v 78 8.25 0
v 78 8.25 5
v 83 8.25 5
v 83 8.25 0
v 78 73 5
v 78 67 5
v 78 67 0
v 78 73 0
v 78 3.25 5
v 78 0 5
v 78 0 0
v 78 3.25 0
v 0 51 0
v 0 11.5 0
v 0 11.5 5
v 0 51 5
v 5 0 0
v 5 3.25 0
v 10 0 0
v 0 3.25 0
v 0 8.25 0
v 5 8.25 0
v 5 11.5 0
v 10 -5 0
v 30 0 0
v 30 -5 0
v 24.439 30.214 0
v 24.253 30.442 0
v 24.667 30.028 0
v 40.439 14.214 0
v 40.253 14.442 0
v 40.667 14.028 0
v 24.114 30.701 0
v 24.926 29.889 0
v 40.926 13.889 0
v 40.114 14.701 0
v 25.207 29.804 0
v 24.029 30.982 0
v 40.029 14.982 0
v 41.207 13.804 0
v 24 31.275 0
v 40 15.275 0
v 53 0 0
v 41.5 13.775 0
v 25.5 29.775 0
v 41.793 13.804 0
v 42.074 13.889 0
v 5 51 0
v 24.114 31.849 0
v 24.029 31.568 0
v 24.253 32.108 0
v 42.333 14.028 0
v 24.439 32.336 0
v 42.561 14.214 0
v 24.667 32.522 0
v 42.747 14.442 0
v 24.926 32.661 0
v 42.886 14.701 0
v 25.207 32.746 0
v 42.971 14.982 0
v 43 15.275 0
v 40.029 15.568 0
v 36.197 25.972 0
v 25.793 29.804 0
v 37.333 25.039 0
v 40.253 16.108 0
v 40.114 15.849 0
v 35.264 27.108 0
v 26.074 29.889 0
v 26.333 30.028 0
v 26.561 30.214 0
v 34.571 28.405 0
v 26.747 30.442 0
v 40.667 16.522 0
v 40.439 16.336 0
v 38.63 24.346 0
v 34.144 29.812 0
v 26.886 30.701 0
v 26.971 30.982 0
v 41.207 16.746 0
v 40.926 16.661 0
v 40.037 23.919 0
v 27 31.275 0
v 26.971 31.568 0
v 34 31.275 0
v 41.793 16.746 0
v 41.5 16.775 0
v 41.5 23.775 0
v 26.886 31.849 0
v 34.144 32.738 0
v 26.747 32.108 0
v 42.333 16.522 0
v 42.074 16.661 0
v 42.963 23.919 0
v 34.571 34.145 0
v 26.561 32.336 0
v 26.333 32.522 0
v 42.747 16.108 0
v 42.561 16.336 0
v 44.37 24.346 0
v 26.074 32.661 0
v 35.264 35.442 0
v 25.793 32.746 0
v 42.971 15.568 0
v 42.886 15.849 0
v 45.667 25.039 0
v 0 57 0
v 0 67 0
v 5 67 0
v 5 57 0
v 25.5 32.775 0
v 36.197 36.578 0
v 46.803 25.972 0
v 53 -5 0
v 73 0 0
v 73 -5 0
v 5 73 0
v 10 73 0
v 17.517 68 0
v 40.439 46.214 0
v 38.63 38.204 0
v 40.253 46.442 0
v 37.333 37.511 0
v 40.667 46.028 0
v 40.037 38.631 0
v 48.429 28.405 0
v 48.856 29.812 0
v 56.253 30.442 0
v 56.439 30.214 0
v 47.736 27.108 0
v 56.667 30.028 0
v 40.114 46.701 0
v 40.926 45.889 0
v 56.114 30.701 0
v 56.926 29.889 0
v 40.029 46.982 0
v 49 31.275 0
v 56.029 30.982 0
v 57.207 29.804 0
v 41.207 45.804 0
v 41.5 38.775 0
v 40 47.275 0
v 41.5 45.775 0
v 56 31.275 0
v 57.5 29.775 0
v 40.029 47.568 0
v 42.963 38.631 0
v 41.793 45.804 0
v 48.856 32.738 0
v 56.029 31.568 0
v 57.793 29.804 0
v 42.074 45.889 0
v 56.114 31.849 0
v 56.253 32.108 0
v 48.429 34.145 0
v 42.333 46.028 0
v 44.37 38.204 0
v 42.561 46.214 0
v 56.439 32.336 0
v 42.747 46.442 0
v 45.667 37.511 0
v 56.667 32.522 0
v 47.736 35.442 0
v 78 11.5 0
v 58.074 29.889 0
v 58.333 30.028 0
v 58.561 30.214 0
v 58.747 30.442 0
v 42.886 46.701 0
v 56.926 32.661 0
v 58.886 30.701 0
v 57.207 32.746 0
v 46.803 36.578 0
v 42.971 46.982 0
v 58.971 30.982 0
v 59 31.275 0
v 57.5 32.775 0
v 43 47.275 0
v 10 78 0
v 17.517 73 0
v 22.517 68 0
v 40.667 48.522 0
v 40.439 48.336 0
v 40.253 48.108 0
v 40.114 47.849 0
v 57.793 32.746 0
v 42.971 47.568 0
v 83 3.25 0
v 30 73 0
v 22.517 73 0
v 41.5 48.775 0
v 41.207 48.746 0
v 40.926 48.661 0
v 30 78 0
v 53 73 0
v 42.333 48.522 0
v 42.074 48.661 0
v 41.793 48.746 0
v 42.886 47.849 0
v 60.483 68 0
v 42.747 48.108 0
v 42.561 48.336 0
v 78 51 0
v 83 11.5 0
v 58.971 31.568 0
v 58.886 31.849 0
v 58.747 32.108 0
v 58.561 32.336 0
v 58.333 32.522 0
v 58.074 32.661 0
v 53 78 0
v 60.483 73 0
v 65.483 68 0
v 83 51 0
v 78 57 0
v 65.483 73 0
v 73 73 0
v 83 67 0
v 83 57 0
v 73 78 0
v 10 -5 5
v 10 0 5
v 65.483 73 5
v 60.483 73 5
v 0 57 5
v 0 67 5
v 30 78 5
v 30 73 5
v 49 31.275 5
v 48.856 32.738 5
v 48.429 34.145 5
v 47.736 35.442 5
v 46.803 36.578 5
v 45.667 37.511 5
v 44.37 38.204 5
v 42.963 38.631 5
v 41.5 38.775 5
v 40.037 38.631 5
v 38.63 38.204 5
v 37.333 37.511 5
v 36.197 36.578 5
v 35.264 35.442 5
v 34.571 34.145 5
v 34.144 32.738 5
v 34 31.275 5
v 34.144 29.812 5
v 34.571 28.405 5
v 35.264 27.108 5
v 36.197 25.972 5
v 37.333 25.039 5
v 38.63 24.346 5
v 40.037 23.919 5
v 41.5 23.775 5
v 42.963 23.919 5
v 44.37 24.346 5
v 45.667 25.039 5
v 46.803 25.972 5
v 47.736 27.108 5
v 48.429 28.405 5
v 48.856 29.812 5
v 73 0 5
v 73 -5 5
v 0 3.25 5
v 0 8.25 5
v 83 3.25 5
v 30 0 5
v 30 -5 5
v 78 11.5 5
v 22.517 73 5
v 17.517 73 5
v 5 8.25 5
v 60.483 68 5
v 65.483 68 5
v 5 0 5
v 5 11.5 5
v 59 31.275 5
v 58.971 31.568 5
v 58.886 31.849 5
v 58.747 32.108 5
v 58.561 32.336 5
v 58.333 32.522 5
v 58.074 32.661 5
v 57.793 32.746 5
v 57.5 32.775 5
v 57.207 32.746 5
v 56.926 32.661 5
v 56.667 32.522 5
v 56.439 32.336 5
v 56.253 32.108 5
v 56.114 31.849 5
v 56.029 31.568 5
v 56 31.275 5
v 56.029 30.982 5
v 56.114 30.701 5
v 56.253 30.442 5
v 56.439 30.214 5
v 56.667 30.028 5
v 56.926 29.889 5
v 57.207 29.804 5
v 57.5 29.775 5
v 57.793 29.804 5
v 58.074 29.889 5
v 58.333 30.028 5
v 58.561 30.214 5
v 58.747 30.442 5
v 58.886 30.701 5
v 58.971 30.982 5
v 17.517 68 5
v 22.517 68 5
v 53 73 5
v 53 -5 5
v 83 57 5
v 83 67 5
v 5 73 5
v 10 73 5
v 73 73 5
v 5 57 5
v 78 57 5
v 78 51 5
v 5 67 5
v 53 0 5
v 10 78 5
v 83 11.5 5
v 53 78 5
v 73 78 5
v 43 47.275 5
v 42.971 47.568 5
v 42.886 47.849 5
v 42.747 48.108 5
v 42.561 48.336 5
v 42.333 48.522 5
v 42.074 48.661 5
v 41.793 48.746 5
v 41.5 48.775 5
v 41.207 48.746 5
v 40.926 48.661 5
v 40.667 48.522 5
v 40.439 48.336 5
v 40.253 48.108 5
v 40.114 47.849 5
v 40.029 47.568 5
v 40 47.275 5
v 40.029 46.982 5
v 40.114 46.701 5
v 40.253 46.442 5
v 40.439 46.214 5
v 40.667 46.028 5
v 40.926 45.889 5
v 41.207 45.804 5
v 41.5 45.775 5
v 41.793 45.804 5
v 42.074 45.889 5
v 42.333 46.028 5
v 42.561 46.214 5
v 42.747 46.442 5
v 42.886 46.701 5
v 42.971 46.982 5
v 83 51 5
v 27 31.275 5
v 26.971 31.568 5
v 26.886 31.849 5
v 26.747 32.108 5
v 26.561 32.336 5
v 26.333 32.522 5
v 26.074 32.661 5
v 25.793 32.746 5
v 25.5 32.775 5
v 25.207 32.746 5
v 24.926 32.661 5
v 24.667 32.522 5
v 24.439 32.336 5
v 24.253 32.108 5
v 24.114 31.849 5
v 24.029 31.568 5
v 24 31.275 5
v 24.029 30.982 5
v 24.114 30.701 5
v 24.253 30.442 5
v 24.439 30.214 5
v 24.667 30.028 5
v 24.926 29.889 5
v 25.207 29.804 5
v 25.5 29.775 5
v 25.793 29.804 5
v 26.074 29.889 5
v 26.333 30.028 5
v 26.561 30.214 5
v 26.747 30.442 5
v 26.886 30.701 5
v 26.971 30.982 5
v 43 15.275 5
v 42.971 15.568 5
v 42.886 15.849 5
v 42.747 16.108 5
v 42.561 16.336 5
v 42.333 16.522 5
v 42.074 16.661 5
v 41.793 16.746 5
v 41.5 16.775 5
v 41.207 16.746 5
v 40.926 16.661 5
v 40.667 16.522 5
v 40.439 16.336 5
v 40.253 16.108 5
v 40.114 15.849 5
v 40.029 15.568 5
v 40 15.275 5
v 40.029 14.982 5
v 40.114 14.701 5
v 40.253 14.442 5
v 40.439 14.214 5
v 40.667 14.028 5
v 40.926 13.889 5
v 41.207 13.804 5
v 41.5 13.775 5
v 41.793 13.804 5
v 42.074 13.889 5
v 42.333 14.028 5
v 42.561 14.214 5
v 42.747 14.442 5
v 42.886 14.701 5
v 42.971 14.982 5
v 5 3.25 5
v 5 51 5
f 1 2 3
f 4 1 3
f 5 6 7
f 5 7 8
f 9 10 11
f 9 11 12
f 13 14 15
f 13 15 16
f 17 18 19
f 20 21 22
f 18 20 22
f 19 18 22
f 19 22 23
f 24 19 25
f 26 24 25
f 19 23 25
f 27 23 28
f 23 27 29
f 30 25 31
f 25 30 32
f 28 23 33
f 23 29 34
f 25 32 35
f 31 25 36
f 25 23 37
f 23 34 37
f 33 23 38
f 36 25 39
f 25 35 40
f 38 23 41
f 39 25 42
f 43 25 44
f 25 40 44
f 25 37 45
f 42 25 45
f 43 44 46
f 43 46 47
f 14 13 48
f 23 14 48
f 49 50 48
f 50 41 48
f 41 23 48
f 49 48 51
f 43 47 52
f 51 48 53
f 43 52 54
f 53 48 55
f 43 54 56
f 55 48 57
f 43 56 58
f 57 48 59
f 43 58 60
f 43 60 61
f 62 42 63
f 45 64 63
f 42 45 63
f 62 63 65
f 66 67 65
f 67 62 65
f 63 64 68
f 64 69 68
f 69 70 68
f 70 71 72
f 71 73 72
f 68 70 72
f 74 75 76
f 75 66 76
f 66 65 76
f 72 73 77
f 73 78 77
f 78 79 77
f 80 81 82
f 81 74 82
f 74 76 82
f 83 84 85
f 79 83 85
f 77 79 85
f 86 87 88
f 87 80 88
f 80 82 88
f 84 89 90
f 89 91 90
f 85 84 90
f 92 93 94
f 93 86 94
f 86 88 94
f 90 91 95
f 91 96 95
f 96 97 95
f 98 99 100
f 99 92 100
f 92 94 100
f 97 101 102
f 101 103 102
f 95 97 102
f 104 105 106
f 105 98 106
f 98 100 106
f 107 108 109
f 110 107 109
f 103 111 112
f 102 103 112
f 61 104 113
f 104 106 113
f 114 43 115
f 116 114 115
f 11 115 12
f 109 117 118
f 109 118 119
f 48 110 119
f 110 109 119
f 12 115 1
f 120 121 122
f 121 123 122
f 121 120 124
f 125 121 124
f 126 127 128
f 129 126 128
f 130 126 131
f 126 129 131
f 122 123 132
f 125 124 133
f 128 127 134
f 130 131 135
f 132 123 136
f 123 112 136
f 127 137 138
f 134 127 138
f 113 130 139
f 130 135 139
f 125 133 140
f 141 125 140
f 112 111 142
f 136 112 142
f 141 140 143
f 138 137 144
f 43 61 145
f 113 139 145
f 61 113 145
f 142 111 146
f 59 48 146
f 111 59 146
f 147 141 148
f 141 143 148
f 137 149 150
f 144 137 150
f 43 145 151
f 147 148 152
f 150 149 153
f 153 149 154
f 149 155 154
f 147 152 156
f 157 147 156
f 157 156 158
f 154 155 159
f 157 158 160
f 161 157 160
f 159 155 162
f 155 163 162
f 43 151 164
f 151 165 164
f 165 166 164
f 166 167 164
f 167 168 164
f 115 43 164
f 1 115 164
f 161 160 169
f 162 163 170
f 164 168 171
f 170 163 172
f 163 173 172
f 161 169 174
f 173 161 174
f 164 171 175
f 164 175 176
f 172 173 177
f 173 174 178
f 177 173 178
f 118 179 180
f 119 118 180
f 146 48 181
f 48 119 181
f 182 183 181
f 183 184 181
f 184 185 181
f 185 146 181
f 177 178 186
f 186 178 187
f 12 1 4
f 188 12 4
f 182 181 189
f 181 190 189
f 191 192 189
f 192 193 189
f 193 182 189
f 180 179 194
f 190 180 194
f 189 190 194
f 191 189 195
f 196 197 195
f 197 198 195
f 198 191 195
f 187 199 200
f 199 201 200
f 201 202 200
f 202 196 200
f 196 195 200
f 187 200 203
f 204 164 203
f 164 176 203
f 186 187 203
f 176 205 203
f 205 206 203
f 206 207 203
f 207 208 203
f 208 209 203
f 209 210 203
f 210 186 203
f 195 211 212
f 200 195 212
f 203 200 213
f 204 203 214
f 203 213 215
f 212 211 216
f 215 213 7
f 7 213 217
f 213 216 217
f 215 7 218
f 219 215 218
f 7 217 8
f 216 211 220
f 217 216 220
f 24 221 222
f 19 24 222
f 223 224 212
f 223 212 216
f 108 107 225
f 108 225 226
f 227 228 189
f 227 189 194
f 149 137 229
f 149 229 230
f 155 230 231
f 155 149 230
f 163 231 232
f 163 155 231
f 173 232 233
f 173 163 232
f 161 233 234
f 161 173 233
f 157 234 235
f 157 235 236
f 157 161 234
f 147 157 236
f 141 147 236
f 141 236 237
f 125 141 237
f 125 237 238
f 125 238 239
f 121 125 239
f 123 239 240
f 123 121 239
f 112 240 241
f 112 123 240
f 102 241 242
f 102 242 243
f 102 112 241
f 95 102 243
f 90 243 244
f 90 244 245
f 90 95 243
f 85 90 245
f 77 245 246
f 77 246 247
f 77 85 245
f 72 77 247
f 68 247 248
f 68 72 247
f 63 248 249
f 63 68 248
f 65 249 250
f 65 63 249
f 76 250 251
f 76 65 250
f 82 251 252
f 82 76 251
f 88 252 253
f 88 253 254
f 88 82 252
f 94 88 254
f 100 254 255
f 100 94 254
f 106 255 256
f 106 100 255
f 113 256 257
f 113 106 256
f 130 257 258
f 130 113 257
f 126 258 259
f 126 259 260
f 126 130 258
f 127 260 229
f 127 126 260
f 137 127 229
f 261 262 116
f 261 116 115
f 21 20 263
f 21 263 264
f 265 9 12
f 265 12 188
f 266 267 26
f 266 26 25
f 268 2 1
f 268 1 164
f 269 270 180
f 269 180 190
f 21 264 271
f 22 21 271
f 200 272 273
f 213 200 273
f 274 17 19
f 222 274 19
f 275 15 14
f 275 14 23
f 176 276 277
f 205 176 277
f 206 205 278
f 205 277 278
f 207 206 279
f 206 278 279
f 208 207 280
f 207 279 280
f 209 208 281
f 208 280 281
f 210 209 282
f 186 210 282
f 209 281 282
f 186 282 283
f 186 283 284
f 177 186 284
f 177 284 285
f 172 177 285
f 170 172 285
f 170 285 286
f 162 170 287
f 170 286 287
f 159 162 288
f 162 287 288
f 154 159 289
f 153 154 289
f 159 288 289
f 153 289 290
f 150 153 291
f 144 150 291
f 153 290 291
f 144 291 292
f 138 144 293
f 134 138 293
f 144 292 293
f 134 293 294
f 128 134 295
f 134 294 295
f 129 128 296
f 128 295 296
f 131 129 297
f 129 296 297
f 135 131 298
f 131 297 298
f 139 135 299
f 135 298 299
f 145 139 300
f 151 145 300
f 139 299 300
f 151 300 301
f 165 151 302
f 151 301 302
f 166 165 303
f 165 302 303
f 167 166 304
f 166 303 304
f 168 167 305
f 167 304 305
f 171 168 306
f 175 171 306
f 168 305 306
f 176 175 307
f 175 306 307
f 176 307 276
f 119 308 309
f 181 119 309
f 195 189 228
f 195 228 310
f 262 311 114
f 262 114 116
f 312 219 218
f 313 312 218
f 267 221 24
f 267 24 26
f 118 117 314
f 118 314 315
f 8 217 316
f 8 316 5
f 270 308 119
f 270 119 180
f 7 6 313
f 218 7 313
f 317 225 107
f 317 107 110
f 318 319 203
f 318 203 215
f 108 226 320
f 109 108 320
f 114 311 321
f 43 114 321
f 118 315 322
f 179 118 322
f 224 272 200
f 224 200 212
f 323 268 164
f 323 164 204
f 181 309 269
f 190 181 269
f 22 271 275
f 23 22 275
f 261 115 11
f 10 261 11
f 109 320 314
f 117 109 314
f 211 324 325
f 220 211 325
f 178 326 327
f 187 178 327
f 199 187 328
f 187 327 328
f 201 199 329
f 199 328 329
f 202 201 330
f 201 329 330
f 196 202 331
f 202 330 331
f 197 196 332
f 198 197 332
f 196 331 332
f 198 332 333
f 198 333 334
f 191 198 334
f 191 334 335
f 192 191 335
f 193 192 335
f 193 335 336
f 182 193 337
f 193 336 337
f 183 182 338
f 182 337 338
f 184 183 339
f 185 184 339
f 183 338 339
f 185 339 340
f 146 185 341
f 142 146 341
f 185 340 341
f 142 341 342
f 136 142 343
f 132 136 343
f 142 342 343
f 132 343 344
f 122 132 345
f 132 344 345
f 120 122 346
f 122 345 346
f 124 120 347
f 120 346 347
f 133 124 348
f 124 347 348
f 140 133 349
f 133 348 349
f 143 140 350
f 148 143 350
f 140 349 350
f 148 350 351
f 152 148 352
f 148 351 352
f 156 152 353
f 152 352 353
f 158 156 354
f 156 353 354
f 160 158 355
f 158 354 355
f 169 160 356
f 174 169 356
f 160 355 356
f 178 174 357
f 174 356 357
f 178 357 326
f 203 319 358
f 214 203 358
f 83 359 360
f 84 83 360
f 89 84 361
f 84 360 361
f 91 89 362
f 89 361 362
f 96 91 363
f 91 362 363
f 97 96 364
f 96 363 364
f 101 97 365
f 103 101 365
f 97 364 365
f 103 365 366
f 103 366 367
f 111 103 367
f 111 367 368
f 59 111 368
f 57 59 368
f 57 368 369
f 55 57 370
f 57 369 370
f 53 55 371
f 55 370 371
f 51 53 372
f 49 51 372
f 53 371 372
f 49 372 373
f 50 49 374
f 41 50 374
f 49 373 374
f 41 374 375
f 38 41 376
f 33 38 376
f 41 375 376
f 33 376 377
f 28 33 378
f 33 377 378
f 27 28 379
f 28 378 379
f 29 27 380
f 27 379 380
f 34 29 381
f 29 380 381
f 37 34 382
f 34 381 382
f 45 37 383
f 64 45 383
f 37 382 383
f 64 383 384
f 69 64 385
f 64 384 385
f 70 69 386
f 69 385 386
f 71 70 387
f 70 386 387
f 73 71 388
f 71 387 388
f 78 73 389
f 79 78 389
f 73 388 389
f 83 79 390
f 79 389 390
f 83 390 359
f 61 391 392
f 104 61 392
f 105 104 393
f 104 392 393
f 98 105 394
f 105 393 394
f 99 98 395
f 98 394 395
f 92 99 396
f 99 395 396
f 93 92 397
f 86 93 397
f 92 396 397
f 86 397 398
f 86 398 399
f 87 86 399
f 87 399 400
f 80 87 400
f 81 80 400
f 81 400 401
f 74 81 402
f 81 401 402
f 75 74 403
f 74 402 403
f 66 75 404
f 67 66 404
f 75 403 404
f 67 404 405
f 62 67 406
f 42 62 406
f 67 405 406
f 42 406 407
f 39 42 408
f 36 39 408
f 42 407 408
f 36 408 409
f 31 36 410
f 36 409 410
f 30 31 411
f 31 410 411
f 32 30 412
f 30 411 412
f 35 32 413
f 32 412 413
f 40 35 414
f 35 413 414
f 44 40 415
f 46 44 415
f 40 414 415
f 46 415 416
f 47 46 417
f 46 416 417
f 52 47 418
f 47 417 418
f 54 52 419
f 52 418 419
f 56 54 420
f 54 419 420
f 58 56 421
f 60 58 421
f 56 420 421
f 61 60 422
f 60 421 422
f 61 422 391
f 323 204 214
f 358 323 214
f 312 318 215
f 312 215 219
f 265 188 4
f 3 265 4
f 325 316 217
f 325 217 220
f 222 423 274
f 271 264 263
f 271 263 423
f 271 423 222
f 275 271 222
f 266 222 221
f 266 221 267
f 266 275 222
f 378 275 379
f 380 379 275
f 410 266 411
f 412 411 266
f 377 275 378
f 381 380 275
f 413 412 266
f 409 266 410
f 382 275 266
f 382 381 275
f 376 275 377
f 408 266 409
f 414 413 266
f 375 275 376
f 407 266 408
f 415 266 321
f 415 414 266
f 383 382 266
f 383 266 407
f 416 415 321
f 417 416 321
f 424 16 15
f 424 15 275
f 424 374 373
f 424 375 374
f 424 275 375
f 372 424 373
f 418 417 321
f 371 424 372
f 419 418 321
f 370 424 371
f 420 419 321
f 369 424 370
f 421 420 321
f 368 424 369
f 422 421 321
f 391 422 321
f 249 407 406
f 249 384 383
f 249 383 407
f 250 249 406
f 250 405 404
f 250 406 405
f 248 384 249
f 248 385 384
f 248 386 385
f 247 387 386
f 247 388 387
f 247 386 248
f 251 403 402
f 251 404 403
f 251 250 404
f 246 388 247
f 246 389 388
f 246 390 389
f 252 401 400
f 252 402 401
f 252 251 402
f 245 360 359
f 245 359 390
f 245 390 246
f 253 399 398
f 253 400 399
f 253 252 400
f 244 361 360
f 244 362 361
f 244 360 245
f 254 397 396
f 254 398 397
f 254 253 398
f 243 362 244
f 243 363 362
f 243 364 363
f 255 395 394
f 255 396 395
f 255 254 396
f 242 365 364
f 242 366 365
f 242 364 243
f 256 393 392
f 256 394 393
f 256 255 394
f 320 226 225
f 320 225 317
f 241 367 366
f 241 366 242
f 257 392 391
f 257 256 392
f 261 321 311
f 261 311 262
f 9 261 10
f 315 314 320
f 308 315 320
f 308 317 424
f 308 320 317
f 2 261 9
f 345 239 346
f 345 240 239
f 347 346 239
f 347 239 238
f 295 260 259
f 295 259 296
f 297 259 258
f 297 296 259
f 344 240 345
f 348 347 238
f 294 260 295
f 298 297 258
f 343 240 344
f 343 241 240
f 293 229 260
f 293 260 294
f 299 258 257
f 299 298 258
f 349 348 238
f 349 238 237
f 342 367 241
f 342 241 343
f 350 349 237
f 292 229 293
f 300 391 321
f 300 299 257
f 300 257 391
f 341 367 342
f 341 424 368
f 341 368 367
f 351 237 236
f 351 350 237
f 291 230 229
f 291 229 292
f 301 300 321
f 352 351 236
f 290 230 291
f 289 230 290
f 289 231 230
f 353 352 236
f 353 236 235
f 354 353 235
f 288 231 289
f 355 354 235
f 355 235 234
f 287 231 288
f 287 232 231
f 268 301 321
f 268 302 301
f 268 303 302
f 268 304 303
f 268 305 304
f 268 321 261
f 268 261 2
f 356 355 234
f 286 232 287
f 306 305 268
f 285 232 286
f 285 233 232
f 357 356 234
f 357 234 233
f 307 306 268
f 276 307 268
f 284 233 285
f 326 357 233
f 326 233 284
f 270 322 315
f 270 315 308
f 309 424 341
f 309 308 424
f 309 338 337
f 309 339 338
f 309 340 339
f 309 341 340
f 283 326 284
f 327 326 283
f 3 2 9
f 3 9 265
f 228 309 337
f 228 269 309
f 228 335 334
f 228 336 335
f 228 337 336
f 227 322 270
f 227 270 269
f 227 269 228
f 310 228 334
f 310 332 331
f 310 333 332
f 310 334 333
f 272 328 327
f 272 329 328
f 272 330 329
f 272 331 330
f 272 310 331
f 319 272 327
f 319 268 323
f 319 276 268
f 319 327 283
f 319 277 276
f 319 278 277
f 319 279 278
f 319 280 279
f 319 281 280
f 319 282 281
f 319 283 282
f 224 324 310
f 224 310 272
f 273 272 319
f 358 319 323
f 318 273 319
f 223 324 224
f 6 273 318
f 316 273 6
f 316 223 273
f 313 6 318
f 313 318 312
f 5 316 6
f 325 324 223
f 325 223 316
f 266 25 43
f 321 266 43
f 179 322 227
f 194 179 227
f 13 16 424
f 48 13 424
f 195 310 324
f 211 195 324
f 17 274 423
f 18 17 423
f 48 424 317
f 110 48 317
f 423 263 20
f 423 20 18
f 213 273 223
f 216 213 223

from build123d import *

# Parameters (mm, degrees)
ESQUISSE1_W             = 83
ESQUISSE1_H             = 73
ESQUISSE1_R             = 7.5
BOSS_EXTRU_1_DEPTH      = 5
ESQUISSE2_R             = 1.5
ESQUISSE2_W             = 5
ESQUISSE2_H             = 6
ESQUISSE2_H_2           = 3.25
ESQUISSE2_H_3           = 5
ENL_V_MAT_EXTRU_1_DEPTH = 5
ESQUISSE3_W             = 20
ESQUISSE3_H             = 5
BOSS_EXTRU_2_DEPTH      = 5


with BuildPart() as part:
    # Esquisse1 → Boss.-Extru.1 (new body)
    with BuildSketch(Plane.XY):
        with Locations((41.5, 36.5)):
            Rectangle(ESQUISSE1_W, ESQUISSE1_H)
        with Locations((41.5, 31.275)):
            Circle(ESQUISSE1_R, mode=Mode.SUBTRACT)
    extrude(amount=BOSS_EXTRU_1_DEPTH)

    # Esquisse2 → Enlèv. mat.-Extru.1 (cut)
    with BuildSketch(Plane.XY.offset(5)):
        with Locations((41.5, 47.275)):
            Circle(ESQUISSE2_R)
        with Locations((25.5, 31.275)):
            Circle(ESQUISSE2_R)
        with Locations((57.5, 31.275)):
            Circle(ESQUISSE2_R)
        with Locations((41.5, 15.275)):
            Circle(ESQUISSE2_R)
        with Locations((80.5, 70)):
            Rectangle(ESQUISSE2_W, ESQUISSE2_H)
        with Locations((80.5, 54)):
            Rectangle(ESQUISSE2_W, ESQUISSE2_H)
        with Locations((80.5, 1.625)):
            Rectangle(ESQUISSE2_W, ESQUISSE2_H_2)
        with Locations((80.5, 9.875)):
            Rectangle(ESQUISSE2_W, ESQUISSE2_H_2)
        with Locations((2.5, 9.875)):
            Rectangle(ESQUISSE2_W, ESQUISSE2_H_2)
        with Locations((2.5, 1.625)):
            Rectangle(ESQUISSE2_W, ESQUISSE2_H_2)
        with Locations((2.5, 54)):
            Rectangle(ESQUISSE2_W, ESQUISSE2_H)
        with Locations((2.5, 70)):
            Rectangle(ESQUISSE2_W, ESQUISSE2_H)
        with Locations((20.016662646, 70.5)):
            Rectangle(ESQUISSE2_W, ESQUISSE2_H_3)
        with Locations((62.983337354, 70.5)):
            Rectangle(ESQUISSE2_W, ESQUISSE2_H_3)
    extrude(amount=-ENL_V_MAT_EXTRU_1_DEPTH, mode=Mode.SUBTRACT)

    # Esquisse3 → Boss.-Extru.2 (add)
    with BuildSketch(Plane.XY.offset(5)):
        with Locations((63, 75.5)):
            Rectangle(ESQUISSE3_W, ESQUISSE3_H)
        with Locations((20, 75.5)):
            Rectangle(ESQUISSE3_W, ESQUISSE3_H)
        with Locations((63, -2.5)):
            Rectangle(ESQUISSE3_W, ESQUISSE3_H)
        with Locations((20, -2.5)):
            Rectangle(ESQUISSE3_W, ESQUISSE3_H)
    extrude(amount=-BOSS_EXTRU_2_DEPTH)


solid = part.part
